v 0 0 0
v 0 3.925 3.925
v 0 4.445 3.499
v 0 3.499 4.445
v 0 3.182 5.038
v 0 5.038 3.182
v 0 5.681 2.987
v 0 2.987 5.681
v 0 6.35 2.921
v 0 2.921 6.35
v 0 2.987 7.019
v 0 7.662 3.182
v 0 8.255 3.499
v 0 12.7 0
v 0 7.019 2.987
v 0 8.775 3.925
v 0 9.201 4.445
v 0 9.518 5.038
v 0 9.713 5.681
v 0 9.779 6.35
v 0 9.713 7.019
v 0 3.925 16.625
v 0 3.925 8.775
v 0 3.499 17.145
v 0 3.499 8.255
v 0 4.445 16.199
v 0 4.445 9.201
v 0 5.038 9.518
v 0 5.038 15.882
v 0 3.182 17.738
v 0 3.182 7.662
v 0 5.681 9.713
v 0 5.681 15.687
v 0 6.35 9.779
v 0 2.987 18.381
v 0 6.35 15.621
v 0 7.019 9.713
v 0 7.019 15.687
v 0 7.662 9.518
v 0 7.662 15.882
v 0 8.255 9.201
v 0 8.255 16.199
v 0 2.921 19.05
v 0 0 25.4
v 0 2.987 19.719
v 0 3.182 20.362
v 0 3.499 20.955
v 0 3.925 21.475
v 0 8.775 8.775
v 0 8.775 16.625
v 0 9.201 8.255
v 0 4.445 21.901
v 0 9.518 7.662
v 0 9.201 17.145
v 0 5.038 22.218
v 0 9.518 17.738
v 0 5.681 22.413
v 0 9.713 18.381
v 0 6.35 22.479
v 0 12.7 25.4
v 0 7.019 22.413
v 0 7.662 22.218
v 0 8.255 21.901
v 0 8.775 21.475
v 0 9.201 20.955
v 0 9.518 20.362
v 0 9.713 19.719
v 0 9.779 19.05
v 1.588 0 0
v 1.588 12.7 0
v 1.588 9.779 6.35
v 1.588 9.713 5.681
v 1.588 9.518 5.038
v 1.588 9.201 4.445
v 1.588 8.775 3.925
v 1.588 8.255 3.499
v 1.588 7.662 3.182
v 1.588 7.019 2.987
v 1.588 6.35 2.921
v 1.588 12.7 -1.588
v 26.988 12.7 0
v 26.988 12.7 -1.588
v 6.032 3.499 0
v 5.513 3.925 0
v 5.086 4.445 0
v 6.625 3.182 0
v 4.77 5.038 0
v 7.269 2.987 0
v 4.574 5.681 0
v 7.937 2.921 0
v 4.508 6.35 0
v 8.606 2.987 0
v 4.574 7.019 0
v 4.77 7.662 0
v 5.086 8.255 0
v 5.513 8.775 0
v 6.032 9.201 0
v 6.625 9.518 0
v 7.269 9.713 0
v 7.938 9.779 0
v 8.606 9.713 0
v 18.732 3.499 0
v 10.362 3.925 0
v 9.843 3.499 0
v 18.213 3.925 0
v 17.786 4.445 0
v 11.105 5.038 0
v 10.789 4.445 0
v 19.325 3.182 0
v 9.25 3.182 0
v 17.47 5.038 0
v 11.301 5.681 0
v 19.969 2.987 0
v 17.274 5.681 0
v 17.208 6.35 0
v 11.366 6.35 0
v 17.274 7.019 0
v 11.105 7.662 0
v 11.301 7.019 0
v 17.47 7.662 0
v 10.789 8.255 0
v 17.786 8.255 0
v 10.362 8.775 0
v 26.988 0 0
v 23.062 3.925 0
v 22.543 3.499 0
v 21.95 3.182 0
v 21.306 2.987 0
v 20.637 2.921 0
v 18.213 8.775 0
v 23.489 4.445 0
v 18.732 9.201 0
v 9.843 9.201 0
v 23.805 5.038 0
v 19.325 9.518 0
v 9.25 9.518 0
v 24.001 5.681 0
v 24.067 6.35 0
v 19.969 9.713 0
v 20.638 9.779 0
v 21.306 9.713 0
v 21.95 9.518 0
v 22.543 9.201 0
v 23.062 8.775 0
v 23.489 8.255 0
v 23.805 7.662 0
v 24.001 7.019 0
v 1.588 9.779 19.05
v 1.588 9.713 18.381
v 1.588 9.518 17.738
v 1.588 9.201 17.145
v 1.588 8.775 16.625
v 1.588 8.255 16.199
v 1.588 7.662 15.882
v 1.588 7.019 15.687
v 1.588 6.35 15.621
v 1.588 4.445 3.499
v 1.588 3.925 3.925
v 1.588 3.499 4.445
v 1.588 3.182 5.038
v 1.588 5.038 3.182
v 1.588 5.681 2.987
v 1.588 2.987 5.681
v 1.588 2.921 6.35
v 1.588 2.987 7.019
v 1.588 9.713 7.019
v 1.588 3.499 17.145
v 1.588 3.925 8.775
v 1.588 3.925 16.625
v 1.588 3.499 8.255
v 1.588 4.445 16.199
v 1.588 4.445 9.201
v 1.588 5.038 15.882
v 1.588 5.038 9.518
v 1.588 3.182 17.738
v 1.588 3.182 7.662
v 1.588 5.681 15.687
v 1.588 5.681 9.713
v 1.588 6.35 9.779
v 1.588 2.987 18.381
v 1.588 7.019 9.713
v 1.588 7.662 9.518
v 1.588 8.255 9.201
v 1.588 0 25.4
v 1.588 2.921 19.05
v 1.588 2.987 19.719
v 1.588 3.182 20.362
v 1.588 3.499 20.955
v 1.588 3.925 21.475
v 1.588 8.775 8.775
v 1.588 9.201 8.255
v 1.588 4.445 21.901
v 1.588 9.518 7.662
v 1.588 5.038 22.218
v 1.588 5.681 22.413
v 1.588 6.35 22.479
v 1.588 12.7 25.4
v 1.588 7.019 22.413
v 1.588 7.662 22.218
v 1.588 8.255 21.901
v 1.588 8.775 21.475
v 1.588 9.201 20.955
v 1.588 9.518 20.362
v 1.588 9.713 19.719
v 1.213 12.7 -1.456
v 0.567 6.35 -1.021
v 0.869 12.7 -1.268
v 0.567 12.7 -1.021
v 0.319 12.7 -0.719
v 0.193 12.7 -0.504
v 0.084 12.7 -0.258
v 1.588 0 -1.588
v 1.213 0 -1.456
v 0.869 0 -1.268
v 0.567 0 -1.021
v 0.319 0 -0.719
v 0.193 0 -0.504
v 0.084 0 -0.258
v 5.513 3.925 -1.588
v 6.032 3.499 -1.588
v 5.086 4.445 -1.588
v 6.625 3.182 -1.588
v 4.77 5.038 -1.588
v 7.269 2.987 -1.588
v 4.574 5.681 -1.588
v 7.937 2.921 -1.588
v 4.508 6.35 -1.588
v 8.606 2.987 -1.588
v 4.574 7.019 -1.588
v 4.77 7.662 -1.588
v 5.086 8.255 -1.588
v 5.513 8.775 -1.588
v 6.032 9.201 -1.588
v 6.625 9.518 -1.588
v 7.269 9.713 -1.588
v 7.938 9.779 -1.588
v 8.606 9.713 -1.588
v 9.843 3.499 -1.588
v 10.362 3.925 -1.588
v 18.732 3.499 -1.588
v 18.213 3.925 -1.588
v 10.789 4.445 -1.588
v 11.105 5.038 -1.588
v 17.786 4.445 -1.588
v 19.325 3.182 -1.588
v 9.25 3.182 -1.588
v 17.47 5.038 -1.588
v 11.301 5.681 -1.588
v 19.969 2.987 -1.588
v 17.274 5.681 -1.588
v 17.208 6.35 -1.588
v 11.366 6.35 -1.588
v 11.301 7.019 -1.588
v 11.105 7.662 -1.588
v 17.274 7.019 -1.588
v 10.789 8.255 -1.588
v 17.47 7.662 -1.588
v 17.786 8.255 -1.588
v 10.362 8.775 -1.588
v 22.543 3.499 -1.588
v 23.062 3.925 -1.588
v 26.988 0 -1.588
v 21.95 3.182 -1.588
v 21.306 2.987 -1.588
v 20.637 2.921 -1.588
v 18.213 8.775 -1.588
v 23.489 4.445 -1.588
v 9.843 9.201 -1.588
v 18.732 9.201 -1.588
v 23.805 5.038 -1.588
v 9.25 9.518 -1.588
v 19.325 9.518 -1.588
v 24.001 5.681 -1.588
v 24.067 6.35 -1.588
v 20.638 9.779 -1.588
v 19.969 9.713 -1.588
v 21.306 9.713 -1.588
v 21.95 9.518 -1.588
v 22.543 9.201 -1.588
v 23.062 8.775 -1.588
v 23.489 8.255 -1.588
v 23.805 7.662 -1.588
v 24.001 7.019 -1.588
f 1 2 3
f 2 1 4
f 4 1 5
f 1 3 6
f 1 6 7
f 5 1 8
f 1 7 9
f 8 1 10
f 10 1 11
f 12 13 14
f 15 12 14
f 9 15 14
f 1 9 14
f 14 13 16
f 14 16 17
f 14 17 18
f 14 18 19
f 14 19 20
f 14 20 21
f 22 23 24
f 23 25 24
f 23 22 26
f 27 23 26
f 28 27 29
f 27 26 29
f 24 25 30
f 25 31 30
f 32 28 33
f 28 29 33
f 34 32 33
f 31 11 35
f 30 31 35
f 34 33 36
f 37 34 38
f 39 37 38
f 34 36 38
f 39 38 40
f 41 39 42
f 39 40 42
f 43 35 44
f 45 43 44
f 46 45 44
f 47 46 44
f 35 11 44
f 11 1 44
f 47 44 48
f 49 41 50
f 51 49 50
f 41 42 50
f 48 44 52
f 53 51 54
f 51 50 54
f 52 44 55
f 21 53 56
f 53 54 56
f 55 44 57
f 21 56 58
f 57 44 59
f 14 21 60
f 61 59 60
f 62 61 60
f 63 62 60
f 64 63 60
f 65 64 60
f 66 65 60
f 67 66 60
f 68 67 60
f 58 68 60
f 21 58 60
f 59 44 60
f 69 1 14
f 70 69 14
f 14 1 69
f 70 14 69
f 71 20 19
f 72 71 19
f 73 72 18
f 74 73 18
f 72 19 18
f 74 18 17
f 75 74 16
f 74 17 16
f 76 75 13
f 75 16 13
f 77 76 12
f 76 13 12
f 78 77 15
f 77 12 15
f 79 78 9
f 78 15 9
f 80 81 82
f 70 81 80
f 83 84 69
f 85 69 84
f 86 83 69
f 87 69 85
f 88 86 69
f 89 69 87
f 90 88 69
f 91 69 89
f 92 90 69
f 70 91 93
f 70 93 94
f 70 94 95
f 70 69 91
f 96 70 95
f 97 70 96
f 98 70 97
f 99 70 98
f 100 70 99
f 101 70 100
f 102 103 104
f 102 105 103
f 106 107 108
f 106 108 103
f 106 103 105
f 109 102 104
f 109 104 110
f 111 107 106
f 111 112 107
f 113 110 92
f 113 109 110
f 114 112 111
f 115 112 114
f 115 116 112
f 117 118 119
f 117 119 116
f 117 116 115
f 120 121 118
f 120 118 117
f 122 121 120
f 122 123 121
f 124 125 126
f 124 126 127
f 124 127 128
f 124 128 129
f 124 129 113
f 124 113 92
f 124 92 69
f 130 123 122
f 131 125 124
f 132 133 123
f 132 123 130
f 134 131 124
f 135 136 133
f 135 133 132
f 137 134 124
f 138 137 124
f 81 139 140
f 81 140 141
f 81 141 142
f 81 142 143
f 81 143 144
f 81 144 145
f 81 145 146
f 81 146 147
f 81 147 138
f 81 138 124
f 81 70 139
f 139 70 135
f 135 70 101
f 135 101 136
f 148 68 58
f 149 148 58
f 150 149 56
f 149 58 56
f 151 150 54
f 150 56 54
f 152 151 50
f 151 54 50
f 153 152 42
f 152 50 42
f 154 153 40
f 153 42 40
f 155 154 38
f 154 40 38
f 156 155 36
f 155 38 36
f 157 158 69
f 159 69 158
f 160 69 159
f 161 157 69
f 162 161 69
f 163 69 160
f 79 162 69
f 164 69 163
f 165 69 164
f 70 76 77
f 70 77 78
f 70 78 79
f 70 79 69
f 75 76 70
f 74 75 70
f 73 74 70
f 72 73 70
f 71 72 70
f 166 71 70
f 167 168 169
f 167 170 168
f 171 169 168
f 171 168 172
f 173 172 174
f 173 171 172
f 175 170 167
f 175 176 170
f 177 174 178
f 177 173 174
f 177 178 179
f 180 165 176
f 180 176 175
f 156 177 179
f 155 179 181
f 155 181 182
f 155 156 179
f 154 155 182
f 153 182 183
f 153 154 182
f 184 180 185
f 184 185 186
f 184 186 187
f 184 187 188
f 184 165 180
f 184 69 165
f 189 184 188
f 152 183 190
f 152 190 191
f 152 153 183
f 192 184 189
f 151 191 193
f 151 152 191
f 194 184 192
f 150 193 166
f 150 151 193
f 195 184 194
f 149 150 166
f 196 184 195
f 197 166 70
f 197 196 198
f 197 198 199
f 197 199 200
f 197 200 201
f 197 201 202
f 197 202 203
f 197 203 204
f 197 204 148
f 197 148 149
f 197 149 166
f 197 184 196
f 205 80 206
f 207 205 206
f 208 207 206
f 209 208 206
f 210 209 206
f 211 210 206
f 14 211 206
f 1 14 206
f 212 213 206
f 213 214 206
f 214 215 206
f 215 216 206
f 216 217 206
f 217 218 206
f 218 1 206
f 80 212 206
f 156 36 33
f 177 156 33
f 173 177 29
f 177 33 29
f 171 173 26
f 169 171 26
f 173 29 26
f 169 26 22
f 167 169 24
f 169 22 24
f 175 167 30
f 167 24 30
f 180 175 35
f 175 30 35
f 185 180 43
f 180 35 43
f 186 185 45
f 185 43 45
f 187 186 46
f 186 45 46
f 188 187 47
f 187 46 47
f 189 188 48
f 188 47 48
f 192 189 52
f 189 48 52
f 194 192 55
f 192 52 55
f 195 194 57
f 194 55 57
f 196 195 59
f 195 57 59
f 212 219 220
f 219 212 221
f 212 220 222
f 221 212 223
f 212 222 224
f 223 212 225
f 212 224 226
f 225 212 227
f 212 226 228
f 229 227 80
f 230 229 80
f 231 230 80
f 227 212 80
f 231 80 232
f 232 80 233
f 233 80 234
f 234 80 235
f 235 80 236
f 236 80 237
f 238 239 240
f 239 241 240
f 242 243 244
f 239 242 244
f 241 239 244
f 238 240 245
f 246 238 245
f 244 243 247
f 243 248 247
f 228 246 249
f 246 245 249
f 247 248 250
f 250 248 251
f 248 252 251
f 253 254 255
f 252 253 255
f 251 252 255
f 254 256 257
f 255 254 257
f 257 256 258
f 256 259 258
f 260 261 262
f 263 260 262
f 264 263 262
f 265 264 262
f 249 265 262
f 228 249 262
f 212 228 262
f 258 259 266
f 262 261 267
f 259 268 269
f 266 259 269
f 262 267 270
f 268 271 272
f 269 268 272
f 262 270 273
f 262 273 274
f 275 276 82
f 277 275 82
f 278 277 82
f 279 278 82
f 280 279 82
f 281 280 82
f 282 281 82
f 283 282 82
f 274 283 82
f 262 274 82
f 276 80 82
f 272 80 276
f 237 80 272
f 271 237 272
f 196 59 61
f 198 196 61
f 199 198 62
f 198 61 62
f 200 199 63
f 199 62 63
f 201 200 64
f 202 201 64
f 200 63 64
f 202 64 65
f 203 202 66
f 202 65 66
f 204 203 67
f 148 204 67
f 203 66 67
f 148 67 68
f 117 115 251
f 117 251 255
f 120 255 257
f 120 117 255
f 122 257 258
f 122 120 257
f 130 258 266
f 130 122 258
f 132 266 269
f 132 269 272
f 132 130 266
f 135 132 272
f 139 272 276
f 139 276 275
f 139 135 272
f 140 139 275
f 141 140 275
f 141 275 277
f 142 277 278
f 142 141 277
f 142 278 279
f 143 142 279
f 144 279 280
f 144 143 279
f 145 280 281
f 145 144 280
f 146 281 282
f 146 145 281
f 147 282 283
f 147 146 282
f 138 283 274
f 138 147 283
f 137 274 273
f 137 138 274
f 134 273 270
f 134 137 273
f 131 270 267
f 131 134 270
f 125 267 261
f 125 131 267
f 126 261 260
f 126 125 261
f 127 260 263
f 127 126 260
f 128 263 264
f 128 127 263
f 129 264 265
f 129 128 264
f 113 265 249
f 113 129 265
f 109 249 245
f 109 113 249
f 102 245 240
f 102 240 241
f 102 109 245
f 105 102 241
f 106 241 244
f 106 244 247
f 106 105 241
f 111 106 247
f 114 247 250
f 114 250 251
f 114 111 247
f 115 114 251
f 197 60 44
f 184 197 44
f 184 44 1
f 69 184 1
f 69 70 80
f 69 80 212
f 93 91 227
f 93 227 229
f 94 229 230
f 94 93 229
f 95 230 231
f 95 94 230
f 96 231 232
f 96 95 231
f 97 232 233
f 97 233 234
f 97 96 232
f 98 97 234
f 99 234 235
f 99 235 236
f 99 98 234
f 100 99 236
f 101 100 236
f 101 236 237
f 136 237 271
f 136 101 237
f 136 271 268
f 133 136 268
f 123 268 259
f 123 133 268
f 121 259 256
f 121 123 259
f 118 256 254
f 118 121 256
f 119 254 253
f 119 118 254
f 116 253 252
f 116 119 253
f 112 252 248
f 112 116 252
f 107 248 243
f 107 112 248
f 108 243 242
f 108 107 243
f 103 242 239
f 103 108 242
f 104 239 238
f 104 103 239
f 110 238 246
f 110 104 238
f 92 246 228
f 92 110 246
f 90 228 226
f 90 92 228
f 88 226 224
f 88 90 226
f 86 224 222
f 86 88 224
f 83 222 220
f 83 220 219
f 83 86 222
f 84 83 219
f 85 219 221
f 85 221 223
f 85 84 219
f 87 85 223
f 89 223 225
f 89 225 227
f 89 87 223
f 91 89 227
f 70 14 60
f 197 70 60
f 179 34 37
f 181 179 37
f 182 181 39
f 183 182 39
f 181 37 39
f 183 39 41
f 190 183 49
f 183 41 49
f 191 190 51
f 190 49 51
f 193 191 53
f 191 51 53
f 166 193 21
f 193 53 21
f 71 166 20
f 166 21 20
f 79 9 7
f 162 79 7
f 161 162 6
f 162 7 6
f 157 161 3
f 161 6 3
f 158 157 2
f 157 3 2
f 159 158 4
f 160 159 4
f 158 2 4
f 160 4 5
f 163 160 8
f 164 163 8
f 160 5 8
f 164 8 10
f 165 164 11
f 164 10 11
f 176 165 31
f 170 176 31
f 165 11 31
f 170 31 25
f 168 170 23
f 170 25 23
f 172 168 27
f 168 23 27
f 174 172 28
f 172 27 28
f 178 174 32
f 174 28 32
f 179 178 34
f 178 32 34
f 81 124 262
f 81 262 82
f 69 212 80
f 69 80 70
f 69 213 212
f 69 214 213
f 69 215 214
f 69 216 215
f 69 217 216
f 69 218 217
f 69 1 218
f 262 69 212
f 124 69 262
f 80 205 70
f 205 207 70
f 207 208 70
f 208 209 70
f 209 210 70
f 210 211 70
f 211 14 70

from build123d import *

# Parameters (mm, degrees)
F1_DEPTH    = 1.5875
F3_DEPTH    = 1.5875
F4_W        = 1.5875
F4_H        = 1.5875
F5_DEPTH    = 12.7
F6_T1_DEPTH = 20.6375


# Not quite as in the source:
# - a fillet or chamfer that OpenCascade refuses, or shapes differently, is made with other operations: its cross-section is extruded or revolved along the edge and cut away or added


with BuildPart() as f1:
    # F0 (on Right) → F1 (new body)
    with BuildSketch(Plane.YZ):
        with BuildLine():
            Line((0, 25.4), (0, 0))
            Line((0, 0), (6.35, 0))
            Line((6.35, 0), (6.35, 2.921))
            ThreePointArc((6.35, 2.921), (2.921, 6.35), (6.35, 9.779))
            Line((6.35, 9.779), (6.35, 12.7))
            Line((6.35, 12.7), (6.35, 15.621))
            ThreePointArc((6.35, 15.621), (2.921, 19.05), (6.35, 22.479))
            Line((6.35, 22.479), (6.35, 25.4))
            Line((6.35, 25.4), (0, 25.4))
        make_face()
        with BuildLine():
            Line((6.35, 2.921), (6.35, 0))
            Line((6.35, 0), (12.7, 0))
            Line((12.7, 0), (12.7, 25.4))
            Line((12.7, 25.4), (6.35, 25.4))
            Line((6.35, 25.4), (6.35, 22.479))
            ThreePointArc((6.35, 22.479), (8.7746691527, 21.4746691527), (9.779, 19.05))
            ThreePointArc((9.779, 19.05), (8.7746691527, 16.6253308473), (6.35, 15.621))
            Line((6.35, 15.621), (6.35, 12.7))
            Line((6.35, 12.7), (6.35, 9.779))
            ThreePointArc((6.35, 9.779), (8.7746691527, 8.7746691527), (9.779, 6.35))
            ThreePointArc((9.779, 6.35), (8.7746691527, 3.9253308473), (6.35, 2.921))
        make_face()
    extrude(amount=F1_DEPTH)


with BuildPart() as f3:
    # F2 (on Top) → F3 (new body)
    with BuildSketch(Plane.XY):
        with BuildLine():
            Line((1.5875, 6.35), (1.5875, 0))
            Line((1.5875, 0), (26.9875, 0))
            Line((26.9875, 0), (26.9875, 6.35))
            Line((26.9875, 6.35), (24.0665, 6.35))
            ThreePointArc((24.0665, 6.35), (20.6375, 2.921), (17.2085, 6.35))
            Line((17.2085, 6.35), (14.2875, 6.35))
            Line((14.2875, 6.35), (11.3665, 6.35))
            ThreePointArc((11.3665, 6.35), (7.9375, 2.921), (4.5085, 6.35))
            Line((4.5085, 6.35), (1.5875, 6.35))
        make_face()
        with BuildLine():
            Line((1.5875, 12.7), (1.5875, 6.35))
            Line((1.5875, 6.35), (4.5085, 6.35))
            ThreePointArc((4.5085, 6.35), (7.9375, 9.779), (11.3665, 6.35))
            Line((11.3665, 6.35), (14.2875, 6.35))
            Line((14.2875, 6.35), (17.2085, 6.35))
            ThreePointArc((17.2085, 6.35), (20.6375, 9.779), (24.0665, 6.35))
            Line((24.0665, 6.35), (26.9875, 6.35))
            Line((26.9875, 6.35), (26.9875, 12.7))
            Line((26.9875, 12.7), (1.5875, 12.7))
        make_face()
    extrude(amount=-F3_DEPTH)


with BuildPart() as f5:
    # F4 (on Front) → F5 (new body, through all)
    with BuildSketch(Plane.XZ):
        with Locations((0.79375, -0.79375)):
            Rectangle(F4_W, F4_H)
    extrude(amount=-F5_DEPTH)

    # F6: fillet of radius 2.2606 on 1 edges, made by hand

    # F6_s2 → F6_t1 (cut)
    with BuildSketch(Plane.XZ.offset(-16.66875)):
        with BuildLine():
            add(Edge.make_bspline(
                [(0, 0), (0.3396631777, -1.2478368223), (1.5875, -1.5875)],
                knots=[0, 0, 0, 1, 1, 1], degree=2, weights=[1, 1, 1]))
            Line((1.5875, -1.5875), (0, -1.5875))
            Line((0, -1.5875), (0, 0))
        make_face()
    extrude(amount=F6_T1_DEPTH, mode=Mode.SUBTRACT)


solid = Compound([f1.part, f3.part, f5.part])
